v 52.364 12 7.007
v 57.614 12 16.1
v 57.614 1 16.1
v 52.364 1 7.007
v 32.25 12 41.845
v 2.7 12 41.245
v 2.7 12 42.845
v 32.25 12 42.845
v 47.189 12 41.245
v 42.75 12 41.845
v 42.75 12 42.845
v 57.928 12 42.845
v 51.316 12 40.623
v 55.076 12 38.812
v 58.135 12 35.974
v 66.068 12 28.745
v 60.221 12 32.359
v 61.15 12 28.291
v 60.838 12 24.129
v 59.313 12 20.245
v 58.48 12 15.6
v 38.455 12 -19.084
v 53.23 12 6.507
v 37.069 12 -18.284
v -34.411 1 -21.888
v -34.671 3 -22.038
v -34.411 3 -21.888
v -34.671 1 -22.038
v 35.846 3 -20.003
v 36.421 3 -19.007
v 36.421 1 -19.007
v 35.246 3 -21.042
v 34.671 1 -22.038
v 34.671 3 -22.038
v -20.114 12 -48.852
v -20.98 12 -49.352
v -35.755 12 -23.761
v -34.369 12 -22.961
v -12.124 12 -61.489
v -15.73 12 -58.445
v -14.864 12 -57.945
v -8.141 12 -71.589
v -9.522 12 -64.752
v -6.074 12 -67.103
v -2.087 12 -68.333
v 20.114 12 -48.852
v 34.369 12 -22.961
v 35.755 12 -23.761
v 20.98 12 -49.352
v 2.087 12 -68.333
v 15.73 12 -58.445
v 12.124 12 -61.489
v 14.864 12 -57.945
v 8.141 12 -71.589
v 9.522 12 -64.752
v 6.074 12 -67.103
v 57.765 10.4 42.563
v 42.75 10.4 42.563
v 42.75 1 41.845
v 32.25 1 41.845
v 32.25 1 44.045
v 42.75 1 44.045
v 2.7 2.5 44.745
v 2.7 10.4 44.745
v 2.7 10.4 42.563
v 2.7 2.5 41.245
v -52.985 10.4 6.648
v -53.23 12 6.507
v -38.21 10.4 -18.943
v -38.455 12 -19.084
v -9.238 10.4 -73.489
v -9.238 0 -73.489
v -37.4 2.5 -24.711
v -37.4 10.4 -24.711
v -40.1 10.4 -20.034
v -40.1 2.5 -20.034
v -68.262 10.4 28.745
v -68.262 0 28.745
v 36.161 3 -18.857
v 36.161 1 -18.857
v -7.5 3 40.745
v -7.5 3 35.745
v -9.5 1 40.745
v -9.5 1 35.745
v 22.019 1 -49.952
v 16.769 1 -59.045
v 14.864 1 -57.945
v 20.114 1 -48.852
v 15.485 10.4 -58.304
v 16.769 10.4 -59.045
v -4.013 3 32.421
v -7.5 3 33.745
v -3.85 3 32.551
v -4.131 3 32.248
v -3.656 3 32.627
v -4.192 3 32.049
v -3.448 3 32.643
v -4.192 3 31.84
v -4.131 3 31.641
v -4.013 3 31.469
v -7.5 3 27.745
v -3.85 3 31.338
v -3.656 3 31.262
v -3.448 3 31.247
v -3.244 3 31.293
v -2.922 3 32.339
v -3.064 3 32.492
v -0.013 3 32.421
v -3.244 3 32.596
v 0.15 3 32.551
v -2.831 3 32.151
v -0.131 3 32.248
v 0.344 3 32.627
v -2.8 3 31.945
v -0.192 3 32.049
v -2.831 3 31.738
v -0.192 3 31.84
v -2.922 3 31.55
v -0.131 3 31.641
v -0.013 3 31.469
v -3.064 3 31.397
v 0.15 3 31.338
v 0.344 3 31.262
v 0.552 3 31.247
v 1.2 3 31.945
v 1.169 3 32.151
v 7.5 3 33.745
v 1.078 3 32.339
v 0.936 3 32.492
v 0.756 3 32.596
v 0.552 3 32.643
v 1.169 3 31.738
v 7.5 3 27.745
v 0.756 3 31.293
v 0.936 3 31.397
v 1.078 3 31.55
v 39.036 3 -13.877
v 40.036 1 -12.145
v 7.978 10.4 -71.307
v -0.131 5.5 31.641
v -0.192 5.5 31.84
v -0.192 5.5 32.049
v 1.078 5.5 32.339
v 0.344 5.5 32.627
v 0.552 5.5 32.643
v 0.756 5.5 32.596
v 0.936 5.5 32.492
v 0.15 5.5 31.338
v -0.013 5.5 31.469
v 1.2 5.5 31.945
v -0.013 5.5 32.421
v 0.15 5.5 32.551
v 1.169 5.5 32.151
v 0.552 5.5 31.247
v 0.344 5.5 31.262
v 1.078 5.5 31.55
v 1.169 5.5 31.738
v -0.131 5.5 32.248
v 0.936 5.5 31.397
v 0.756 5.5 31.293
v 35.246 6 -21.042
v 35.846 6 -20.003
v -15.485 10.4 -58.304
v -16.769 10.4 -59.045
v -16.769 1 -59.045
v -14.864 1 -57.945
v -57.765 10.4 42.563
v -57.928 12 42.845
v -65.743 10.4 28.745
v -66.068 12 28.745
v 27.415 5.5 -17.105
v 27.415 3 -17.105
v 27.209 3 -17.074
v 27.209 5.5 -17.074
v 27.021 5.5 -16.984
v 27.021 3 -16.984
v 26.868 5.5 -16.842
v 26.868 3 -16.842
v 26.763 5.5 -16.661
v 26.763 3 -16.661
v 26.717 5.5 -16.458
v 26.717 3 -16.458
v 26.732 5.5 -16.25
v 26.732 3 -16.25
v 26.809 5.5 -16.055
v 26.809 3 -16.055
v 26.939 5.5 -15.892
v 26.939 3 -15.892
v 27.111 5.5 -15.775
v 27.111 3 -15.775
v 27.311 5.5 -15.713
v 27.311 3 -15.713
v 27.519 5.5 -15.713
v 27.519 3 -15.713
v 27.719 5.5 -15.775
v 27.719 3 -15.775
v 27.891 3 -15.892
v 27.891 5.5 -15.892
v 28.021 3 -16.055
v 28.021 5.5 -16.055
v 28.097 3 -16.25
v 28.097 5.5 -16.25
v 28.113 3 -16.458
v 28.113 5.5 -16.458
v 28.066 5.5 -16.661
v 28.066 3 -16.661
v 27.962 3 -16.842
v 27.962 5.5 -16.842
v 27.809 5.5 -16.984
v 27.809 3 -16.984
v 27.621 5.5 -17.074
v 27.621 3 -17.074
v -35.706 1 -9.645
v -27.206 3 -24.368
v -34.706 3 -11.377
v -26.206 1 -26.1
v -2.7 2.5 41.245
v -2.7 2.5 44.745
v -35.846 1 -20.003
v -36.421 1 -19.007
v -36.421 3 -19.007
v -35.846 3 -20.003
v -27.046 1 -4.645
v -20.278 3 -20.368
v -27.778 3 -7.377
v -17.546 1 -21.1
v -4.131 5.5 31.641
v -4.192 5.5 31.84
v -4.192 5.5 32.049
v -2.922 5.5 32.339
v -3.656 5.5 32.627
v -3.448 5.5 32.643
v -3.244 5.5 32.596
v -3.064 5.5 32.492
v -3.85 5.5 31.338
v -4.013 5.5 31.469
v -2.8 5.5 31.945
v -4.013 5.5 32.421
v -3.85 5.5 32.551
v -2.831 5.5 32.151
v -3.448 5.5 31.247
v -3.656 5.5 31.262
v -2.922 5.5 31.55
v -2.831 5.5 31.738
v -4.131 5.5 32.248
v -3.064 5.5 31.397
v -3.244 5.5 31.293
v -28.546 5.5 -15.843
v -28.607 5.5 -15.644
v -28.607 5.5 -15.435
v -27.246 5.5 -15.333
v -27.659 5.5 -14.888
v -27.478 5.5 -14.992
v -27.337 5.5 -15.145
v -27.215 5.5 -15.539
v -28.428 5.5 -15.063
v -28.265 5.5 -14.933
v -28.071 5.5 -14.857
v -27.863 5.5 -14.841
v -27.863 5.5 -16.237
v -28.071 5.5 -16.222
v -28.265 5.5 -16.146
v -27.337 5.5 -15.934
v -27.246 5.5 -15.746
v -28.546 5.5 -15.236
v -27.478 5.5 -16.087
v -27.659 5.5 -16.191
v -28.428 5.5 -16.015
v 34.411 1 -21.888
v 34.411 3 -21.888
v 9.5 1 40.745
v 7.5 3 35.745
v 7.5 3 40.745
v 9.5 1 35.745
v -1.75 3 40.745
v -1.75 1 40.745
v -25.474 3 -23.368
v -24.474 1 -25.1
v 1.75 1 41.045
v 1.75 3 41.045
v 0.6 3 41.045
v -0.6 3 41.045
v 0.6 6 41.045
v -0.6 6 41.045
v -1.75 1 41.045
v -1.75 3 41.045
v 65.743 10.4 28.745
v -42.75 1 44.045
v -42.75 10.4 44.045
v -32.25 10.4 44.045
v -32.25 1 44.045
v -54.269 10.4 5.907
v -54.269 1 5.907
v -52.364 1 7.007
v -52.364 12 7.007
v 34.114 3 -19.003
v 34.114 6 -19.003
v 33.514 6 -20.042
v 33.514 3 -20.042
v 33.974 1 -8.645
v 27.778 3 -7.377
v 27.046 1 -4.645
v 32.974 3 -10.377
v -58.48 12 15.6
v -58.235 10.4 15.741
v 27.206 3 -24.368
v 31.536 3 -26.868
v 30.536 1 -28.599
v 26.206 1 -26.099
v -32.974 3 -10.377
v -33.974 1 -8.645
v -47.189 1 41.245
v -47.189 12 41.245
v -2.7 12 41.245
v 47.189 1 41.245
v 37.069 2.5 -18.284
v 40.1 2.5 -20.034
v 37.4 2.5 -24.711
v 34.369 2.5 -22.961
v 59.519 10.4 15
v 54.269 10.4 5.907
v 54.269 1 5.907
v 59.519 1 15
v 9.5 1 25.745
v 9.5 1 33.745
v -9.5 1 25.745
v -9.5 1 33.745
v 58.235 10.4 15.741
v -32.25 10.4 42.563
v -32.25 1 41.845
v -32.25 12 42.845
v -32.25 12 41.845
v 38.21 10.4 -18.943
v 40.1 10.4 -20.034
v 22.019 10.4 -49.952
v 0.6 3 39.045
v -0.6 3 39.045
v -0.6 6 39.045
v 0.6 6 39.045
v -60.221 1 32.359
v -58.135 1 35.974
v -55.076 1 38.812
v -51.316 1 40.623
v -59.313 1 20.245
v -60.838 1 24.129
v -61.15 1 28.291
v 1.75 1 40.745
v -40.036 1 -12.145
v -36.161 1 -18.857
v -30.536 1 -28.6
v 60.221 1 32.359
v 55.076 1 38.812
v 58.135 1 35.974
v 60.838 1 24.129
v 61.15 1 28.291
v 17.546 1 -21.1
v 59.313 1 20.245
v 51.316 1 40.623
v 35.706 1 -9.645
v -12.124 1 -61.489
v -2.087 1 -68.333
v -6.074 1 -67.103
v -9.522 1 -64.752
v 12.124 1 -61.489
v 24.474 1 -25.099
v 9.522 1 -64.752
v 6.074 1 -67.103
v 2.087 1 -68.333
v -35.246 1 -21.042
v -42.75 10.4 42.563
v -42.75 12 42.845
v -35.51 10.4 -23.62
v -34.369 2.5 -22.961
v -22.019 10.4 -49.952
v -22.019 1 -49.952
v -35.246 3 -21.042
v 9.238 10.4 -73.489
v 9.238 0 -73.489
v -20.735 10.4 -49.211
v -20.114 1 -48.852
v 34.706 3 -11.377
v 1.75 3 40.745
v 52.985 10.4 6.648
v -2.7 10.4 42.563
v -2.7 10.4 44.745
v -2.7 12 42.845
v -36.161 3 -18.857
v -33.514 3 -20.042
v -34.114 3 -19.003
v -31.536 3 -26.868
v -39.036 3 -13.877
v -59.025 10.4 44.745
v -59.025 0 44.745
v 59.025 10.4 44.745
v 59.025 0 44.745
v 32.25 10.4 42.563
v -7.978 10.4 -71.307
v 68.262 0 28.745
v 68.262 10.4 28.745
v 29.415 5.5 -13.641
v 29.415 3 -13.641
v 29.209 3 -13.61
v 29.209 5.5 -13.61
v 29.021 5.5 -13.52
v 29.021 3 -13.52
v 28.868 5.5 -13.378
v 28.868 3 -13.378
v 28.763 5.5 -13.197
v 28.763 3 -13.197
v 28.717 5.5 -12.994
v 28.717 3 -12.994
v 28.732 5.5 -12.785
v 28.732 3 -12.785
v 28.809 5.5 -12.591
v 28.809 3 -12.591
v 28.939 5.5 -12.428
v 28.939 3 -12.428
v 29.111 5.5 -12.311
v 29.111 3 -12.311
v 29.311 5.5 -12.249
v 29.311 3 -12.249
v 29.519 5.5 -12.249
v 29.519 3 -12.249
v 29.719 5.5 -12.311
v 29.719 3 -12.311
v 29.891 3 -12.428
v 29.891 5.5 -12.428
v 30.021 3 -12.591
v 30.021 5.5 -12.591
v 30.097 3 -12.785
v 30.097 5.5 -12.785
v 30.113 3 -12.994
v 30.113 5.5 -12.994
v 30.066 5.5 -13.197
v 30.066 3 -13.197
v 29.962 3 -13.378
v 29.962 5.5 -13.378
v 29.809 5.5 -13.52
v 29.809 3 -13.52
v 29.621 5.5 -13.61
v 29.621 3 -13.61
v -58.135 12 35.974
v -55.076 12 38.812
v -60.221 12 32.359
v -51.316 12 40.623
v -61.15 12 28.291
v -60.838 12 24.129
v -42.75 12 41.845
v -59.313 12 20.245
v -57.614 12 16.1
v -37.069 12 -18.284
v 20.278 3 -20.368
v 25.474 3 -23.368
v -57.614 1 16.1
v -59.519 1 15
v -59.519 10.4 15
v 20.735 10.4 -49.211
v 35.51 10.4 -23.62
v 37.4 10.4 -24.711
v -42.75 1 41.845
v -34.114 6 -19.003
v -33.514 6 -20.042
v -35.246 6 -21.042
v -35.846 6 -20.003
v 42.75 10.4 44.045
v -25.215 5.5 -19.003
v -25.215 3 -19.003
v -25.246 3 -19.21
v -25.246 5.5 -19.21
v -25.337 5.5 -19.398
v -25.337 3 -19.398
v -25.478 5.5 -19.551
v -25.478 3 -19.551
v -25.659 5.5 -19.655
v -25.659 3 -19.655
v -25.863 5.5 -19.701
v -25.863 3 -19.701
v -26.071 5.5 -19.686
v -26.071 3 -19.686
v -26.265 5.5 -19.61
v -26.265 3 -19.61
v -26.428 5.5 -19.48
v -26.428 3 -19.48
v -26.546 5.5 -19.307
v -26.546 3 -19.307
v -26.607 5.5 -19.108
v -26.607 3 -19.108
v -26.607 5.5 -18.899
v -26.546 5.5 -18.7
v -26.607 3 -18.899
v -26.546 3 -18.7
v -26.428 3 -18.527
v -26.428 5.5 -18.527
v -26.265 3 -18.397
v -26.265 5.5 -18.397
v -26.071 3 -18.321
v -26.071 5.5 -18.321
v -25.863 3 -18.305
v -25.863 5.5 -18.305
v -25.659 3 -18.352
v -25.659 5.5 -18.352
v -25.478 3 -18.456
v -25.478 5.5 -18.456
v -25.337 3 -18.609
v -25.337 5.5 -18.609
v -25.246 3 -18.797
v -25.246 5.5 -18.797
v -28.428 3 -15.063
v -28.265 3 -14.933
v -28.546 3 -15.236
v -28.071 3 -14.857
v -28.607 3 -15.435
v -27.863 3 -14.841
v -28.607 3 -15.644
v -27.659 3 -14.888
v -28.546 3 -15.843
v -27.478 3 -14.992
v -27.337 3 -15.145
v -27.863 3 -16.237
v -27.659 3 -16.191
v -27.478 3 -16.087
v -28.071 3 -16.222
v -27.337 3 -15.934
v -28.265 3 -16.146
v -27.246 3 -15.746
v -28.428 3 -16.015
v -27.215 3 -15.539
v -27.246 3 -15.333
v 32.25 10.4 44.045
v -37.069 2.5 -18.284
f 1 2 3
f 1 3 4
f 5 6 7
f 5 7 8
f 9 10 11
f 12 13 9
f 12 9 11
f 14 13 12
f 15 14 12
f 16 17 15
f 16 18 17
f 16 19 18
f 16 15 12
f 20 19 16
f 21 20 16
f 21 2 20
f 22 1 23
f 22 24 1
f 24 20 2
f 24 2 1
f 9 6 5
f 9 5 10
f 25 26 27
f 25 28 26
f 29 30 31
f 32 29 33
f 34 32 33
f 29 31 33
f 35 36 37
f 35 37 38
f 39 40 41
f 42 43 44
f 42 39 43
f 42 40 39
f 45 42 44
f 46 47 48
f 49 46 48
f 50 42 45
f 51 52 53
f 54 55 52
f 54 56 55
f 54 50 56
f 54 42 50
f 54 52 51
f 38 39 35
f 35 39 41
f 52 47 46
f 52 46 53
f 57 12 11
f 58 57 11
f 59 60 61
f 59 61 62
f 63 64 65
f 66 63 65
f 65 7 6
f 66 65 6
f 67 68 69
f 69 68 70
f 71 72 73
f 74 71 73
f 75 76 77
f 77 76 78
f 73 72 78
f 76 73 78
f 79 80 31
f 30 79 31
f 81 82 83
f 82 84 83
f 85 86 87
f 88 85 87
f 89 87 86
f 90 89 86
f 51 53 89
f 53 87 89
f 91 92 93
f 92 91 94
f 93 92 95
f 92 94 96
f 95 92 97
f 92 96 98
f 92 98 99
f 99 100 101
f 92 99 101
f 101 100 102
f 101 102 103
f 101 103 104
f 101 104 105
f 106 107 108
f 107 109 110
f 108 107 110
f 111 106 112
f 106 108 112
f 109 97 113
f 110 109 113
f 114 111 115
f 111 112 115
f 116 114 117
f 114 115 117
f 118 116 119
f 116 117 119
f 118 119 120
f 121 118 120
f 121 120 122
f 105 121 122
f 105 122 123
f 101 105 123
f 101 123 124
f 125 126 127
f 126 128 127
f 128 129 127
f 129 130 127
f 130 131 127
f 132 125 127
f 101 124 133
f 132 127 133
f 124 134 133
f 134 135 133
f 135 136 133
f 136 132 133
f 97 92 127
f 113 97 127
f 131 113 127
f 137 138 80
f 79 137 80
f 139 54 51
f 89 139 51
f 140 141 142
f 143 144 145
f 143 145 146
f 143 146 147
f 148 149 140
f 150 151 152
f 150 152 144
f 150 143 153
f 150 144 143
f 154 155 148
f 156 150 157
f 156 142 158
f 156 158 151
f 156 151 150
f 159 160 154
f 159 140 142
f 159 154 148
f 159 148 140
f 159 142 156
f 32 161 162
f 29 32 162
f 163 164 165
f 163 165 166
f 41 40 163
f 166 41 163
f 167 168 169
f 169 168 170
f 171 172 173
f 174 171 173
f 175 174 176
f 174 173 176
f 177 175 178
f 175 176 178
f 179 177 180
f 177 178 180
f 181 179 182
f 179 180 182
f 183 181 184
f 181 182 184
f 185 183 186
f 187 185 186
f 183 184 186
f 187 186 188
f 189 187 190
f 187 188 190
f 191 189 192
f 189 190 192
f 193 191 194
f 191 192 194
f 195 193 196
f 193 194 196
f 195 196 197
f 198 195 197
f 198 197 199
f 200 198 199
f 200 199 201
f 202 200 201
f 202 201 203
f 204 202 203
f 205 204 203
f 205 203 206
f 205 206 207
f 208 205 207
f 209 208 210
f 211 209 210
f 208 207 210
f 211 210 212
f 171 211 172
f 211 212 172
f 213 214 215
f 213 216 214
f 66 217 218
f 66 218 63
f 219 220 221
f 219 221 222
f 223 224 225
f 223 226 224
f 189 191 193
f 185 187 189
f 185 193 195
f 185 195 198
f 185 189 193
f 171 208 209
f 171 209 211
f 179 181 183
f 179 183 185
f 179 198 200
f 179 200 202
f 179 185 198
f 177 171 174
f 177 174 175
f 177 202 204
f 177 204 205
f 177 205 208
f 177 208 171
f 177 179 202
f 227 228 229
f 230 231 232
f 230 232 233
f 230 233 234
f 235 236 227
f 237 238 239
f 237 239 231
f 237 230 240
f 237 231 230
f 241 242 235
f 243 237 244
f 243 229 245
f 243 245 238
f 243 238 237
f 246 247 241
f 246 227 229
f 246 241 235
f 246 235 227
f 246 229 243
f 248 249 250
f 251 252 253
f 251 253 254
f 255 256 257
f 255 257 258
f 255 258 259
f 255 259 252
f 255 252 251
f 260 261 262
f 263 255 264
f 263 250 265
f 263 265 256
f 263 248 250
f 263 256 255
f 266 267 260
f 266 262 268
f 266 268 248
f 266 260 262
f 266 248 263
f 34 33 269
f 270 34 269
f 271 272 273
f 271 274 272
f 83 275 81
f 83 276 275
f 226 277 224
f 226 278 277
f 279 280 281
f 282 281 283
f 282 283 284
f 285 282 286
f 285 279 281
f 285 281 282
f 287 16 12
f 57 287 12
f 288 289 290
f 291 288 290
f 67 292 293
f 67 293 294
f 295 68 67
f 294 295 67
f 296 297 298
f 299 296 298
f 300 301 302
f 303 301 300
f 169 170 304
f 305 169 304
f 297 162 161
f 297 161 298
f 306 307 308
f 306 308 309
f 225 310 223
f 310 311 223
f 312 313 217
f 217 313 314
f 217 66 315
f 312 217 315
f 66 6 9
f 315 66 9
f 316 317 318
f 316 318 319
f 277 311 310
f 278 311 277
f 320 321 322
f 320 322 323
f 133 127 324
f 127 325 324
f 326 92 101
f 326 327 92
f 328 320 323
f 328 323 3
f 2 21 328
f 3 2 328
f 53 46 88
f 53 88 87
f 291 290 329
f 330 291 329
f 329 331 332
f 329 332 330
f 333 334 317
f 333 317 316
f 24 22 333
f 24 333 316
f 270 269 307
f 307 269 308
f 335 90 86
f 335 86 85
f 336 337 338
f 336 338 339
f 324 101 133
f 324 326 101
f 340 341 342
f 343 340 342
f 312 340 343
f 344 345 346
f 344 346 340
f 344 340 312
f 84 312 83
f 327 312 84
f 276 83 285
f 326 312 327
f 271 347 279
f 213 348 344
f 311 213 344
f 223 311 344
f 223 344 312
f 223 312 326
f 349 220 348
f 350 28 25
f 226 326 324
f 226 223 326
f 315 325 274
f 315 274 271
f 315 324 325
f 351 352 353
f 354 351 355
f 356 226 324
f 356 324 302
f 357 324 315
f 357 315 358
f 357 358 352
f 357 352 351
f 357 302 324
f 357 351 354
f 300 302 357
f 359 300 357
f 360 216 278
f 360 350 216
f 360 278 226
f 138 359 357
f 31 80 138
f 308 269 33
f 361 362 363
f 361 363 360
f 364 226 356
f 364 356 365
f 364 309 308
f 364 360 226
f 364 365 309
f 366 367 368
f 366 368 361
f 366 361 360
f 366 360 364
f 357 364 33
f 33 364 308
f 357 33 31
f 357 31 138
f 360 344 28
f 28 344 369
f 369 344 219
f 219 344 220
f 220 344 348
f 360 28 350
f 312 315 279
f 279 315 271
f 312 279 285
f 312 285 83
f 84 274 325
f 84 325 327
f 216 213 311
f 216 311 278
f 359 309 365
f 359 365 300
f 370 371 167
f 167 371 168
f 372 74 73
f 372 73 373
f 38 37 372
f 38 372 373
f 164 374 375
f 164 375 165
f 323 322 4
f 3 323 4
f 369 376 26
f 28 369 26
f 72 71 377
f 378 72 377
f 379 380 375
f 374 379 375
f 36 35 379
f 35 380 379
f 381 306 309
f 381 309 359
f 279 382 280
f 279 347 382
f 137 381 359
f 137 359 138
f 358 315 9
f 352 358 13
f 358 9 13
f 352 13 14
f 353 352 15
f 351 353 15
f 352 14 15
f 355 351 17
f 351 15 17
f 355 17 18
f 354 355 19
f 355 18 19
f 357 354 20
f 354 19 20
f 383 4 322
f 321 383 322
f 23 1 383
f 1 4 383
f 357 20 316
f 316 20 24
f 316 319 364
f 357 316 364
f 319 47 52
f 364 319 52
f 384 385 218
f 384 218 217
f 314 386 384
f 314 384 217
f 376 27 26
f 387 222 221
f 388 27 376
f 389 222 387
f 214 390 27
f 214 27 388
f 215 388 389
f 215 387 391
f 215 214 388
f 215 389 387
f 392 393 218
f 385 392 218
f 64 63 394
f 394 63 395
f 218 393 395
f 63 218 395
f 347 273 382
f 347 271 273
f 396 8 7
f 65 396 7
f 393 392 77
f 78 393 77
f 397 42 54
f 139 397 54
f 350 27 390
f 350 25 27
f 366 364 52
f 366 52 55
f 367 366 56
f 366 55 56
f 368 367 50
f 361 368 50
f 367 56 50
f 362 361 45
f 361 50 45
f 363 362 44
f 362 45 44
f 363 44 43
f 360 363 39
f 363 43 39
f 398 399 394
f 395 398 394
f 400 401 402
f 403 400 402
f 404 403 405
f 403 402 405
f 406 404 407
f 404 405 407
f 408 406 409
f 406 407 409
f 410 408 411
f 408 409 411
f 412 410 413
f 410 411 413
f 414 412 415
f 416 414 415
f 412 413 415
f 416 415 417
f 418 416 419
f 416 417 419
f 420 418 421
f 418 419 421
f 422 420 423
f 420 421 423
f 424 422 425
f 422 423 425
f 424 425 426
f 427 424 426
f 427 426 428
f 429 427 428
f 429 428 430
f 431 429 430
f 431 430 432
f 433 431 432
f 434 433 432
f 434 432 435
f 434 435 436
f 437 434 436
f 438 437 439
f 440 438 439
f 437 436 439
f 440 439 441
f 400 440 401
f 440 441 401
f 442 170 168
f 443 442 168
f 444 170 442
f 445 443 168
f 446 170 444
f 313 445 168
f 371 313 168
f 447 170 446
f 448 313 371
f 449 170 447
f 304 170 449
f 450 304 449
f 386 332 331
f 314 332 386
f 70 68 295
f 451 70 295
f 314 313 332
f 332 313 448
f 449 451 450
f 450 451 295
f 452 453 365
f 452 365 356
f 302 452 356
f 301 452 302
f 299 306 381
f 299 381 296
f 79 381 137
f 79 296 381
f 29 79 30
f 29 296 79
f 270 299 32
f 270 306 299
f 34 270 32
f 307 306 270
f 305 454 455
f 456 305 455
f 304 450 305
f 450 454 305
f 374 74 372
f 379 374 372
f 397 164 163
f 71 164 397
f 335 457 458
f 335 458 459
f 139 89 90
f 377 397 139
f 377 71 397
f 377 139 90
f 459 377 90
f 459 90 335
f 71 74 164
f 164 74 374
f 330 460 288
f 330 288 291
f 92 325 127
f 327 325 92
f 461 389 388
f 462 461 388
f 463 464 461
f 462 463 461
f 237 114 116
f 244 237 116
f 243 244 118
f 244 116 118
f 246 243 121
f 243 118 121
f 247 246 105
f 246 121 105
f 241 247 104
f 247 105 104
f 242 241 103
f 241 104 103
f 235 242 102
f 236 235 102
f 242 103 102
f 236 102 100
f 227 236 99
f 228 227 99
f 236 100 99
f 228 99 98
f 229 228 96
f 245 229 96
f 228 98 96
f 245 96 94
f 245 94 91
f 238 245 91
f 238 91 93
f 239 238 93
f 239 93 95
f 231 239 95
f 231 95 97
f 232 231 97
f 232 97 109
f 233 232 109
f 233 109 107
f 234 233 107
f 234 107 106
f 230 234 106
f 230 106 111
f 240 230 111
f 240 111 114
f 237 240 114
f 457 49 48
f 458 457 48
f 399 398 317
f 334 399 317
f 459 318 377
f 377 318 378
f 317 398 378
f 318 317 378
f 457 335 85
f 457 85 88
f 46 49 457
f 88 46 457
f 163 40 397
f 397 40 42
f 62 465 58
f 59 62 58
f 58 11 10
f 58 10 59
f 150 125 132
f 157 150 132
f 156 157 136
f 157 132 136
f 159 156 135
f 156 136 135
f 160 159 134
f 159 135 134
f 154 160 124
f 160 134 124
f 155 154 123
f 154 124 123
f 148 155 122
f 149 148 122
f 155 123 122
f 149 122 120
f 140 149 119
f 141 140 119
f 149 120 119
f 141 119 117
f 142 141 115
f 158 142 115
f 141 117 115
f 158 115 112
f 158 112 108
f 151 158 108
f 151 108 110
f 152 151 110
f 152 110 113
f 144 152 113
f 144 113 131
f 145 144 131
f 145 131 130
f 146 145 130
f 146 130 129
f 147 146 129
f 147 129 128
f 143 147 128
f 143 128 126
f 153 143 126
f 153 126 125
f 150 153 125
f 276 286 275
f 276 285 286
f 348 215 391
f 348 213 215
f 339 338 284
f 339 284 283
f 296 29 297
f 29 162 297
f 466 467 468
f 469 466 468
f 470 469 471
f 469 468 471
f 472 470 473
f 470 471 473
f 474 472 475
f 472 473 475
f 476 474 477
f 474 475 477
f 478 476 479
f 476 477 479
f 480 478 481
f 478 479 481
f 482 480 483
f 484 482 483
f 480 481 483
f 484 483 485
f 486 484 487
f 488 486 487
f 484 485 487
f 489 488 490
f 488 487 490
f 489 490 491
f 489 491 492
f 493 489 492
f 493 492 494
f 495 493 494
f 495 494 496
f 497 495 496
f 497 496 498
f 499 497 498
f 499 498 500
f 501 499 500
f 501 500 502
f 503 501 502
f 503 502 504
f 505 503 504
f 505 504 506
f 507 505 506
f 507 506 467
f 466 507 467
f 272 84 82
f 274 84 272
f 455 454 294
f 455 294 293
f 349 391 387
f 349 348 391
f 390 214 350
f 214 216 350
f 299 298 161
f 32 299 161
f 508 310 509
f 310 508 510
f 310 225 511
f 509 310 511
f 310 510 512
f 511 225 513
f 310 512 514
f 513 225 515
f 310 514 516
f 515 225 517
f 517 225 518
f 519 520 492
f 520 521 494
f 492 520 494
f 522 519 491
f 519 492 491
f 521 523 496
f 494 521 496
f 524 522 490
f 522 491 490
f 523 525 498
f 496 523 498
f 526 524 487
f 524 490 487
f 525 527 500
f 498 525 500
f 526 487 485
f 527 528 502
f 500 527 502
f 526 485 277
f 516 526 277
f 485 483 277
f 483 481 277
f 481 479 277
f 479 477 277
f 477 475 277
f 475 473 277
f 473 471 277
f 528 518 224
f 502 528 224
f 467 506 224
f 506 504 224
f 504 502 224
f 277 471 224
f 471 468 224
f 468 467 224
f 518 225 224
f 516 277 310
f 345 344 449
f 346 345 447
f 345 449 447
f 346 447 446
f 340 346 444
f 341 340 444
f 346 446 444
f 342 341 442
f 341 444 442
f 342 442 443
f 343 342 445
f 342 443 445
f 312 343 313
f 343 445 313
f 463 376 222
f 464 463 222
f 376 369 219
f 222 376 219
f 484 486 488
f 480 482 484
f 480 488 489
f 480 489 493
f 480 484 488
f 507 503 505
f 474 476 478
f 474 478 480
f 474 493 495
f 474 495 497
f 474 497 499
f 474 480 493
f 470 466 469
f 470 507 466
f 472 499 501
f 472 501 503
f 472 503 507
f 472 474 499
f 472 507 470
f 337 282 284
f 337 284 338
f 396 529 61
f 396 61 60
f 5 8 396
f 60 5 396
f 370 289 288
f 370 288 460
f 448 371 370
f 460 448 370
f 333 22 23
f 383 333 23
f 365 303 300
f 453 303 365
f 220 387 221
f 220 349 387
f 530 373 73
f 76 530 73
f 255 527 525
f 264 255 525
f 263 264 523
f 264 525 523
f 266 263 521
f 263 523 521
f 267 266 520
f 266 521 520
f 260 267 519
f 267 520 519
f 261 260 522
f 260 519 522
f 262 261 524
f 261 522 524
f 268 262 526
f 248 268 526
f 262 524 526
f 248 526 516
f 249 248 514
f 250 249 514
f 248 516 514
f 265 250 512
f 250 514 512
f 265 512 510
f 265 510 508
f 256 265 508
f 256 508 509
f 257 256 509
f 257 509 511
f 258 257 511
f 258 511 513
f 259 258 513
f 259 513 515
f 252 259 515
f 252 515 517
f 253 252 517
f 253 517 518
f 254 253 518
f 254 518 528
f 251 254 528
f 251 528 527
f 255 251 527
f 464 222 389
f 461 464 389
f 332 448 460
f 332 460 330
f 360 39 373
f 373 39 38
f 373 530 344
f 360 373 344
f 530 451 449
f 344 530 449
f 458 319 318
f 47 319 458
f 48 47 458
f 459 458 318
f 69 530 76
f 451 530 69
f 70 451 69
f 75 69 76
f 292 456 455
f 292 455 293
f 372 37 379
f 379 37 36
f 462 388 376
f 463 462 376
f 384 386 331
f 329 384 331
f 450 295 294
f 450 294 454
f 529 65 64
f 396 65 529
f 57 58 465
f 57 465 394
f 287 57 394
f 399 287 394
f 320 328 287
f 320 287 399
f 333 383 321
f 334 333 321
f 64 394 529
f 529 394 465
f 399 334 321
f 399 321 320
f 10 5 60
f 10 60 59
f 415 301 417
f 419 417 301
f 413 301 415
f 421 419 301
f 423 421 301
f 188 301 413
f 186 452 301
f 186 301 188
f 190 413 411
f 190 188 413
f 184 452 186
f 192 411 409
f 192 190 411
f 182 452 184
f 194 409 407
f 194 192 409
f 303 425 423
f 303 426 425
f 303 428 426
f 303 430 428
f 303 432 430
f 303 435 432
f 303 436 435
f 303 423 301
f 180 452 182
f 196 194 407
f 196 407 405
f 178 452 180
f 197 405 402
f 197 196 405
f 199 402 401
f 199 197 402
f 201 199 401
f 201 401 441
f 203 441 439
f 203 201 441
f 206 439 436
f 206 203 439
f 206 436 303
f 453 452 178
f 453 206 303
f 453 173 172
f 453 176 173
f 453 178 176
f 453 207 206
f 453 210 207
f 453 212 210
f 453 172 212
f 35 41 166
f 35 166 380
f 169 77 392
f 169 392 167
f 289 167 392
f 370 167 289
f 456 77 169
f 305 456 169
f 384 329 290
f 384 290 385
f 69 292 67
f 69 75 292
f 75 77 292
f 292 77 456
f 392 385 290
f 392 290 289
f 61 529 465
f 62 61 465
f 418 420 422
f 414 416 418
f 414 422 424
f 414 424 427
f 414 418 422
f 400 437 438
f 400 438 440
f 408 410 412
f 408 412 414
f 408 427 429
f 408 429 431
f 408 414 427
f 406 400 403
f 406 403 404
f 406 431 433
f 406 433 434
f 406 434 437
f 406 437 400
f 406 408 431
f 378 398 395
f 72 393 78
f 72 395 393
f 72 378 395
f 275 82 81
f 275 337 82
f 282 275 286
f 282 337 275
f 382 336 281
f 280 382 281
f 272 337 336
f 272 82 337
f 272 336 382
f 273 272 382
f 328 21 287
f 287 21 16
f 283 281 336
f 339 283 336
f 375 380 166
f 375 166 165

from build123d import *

# Parameters (mm, degrees)
BOSS_EXTRU_1_DEPTH                        = 12
ENL_V_MAT_EXTRU_1_DEPTH                   = 119.989845505
ENL_V_MAT_EXTRU_2_DEPTH                   = 11
ESQUISSE4_W                               = 5.4
ESQUISSE4_H                               = 3.5
ENL_V_MAT_EXTRU_3_DEPTH                   = 9.5
BOSS_EXTRU_2_DEPTH                        = 2
ESQUISSE13_R                              = 0.7
BOSS_EXTRU_3_DEPTH                        = 2.5
BOSS_EXTRU_8_DEPTH                        = 3
CHANFREIN4_SIZE                           = 2
ENL_V_MAT_EXTRU_11_DEPTH                  = 2
R_P_TITION_START                          = 1
R_P_TITION_CIRCULAIRE1_OUTLINE_W          = 1.2
R_P_TITION_CIRCULAIRE1_OUTLINE_H          = 2
R_P_TITION_CIRCULAIRE1_OUTLINE_R          = 0.7
R_P_TITION_CIRCULAIRE1_DEPTH              = 4.5
R_P_TITION_START_2                        = 5.5
R_P_TITION_CIRCULAIRE1_2_OUTLINE_W        = 1.2
R_P_TITION_CIRCULAIRE1_2_OUTLINE_H        = 2
R_P_TITION_CIRCULAIRE1_2_DEPTH            = 0.5
ENL_V_DE_MAT_EXTRU_MINCE1_DEPTH           = 1.6
ENL_V_DE_MAT_EXTRU_MINCE1_DRAFT           = 10
ENL_V_DE_MAT_EXTRU_MINCE1_PROFILE_2_DEPTH = 1.6
ENL_V_DE_MAT_EXTRU_MINCE1_PROFILE_2_DRAFT = 10
ENL_V_DE_MAT_EXTRU_MINCE1_PROFILE_3_DEPTH = 1.6
ENL_V_DE_MAT_EXTRU_MINCE1_PROFILE_3_DRAFT = 10
ESQUISSE18_W                              = 10.5
ESQUISSE18_H                              = 2.2
ENL_V_MAT_EXTRU_10_DEPTH                  = 11


with BuildPart() as part:
    # Esquisse1 → Boss.-Extru.1 (new body)
    with BuildSketch(Plane(origin=(0, 0, 0), x_dir=(1, 0, 0), z_dir=(0, 1, 0))):
        Polygon((-77.5, -44.744645862), (77.5, -44.744645862), (0, 89.489291724), align=None)
    extrude(amount=BOSS_EXTRU_1_DEPTH)

    # Esquisse2 → Enlèv. mat.-Extru.1 (cut, through all)
    with BuildSketch(Plane(origin=(0, 12, 0), x_dir=(1, 0, 0), z_dir=(0, 1, 0))):
        Polygon((-9.237604307, 73.489291724), (9.237604307, 73.489291724), (0, 89.489291724), align=None)
        Polygon((77.5, -44.744645862), (68.262395693, -28.744645862), (59.024791386, -44.744645862), align=None)
        Polygon((-77.5, -44.744645862), (-59.024791386, -44.744645862), (-68.262395693, -28.744645862), align=None)
    extrude(amount=-ENL_V_MAT_EXTRU_1_DEPTH, mode=Mode.SUBTRACT)

    # Esquisse3 → Enlèv. mat.-Extru.2 (cut)
    with BuildSketch(Plane(origin=(0, 12, 0), x_dir=(1, 0, 0), z_dir=(0, 1, 0))):
        with BuildLine():
            Line((59.313466521, -20.244645862), (12.124355653, 61.489291724))
            ThreePointArc((12.124355653, 61.489291724), (0, 68.489291724), (-12.124355653, 61.489291724))
            Line((-12.124355653, 61.489291724), (-59.313466521, -20.244645862))
            ThreePointArc((-59.313466521, -20.244645862), (-59.313466521, -34.244645862), (-47.189110868, -41.244645862))
            Line((-47.189110868, -41.244645862), (47.189110868, -41.244645862))
            ThreePointArc((47.189110868, -41.244645862), (59.313466521, -34.244645862), (59.313466521, -20.244645862))
        make_face()
    extrude(amount=-ENL_V_MAT_EXTRU_2_DEPTH, mode=Mode.SUBTRACT)

    # Esquisse4 → Enlèv. mat.-Extru.3 (cut)
    with BuildSketch(Plane(origin=(0, 12, 0), x_dir=(1, 0, 0), z_dir=(0, 1, 0))):
        Polygon((37.068911087, 18.284054341), (34.368911087, 22.960591521), (37.4, 24.710591521), (40.1, 20.034054341), align=None)
        with Locations((0, -42.994645862)):
            Rectangle(ESQUISSE4_W, ESQUISSE4_H)
        Polygon((-37.4, 24.710591521), (-34.368911087, 22.960591521), (-37.068911087, 18.284054341), (-40.1, 20.034054341), align=None)
    extrude(amount=-ENL_V_MAT_EXTRU_3_DEPTH, mode=Mode.SUBTRACT)

    # Esquisse12 → Boss.-Extru.2 (add)
    with BuildSketch(Plane(origin=(0, 1, 0), x_dir=(1, 0, 0), z_dir=(0, 1, 0))):
        Polygon((20.277568136, 20.367513459), (27.777568136, 7.377132403), (39.035898385, 13.877132403), (36.160898385, 18.856778474), (36.420706006, 19.006778474), (34.670706006, 22.037867388), (34.410898385, 21.887867388), (31.535898385, 26.867513459), align=None)
    extrude(amount=BOSS_EXTRU_2_DEPTH)

    # Esquisse13 → Boss.-Extru.3 (add)
    with BuildSketch(Plane(origin=(0, 3, 0), x_dir=(1, 0, 0), z_dir=(0, 1, 0))):
        with Locations(Location((27.414874832, 16.405335633, 0), (0, 0, 90))):
            Circle(ESQUISSE13_R)
        with Locations(Location((29.414874832, 12.941234018, 0), (0, 0, 90))):
            Circle(ESQUISSE13_R)
    extrude(amount=BOSS_EXTRU_3_DEPTH)

    # Esquisse20 → Boss.-Extru.8 (add, symmetric)
    with BuildSketch(Plane(origin=(0, 3, 0), x_dir=(1, 0, 0), z_dir=(0, 1, 0))):
        Polygon((35.245706006, 21.041938173), (35.845706006, 20.002707689), (34.113655198, 19.002707689), (33.513655198, 20.041938173), align=None)
    extrude(amount=BOSS_EXTRU_8_DEPTH, both=True)

    # Chanfrein4
    chanfrein4_edges = [part.edges().sort_by_distance(p)[0] for p in [
        (25.90673326, 1, -23.617513459),
        (24.027568136, 1, -13.872322931),
        (33.40673326, 1, -10.627132403),
    ]]
    chamfer(chanfrein4_edges, length=CHANFREIN4_SIZE - 0.0001)  # a hair under: the kernel refuses the full size

    # Esquisse21 → Enlèv. mat.-Extru.11 (cut)
    with BuildSketch(Plane(origin=(0, 3, 0), x_dir=(1, 0, 0), z_dir=(0, 1, 0))):
        Polygon((24.473720558, 25.099564267), (26.205771366, 26.099564267), (35.705771366, 9.645081595), (33.973720558, 8.645081595), align=None)
    extrude(amount=-ENL_V_MAT_EXTRU_11_DEPTH, mode=Mode.SUBTRACT)

    # Répétition circulaire1: read off the stored shape, not the designer's step
    # Répétition circulaire1 outline → Répétition circulaire1 (add)
    with BuildSketch(Plane(origin=(0, 0, 0), x_dir=(1, 0, 0), z_dir=(0, 1, 0)).offset(R_P_TITION_START)):
        Polygon((-35.245706006, 21.041938173), (-35.845706006, 20.002707689), (-34.113655198, 19.002707689), (-33.513655198, 20.041938173), align=None)
        with Locations((0, -40.044645862)):
            Rectangle(R_P_TITION_CIRCULAIRE1_OUTLINE_W, R_P_TITION_CIRCULAIRE1_OUTLINE_H)
        with Locations((-27.914874832, 15.539310229)):
            Circle(R_P_TITION_CIRCULAIRE1_OUTLINE_R)
        with Locations((-25.914874832, 19.003411844)):
            Circle(R_P_TITION_CIRCULAIRE1_OUTLINE_R)
        with Locations((0.5, -31.944645862)):
            Circle(R_P_TITION_CIRCULAIRE1_OUTLINE_R)
        with Locations((-3.5, -31.944645862)):
            Circle(R_P_TITION_CIRCULAIRE1_OUTLINE_R)
    extrude(amount=R_P_TITION_CIRCULAIRE1_DEPTH)

    # R_p_tition circulaire1 2 outline → R_p_tition circulaire1 2 (add)
    with BuildSketch(Plane(origin=(0, 0, 0), x_dir=(1, 0, 0), z_dir=(0, 1, 0)).offset(R_P_TITION_START_2)):
        Polygon((-35.245706006, 21.041938173), (-35.845706006, 20.002707689), (-34.113655198, 19.002707689), (-33.513655198, 20.041938173), align=None)
        with Locations((0, -40.044645862)):
            Rectangle(R_P_TITION_CIRCULAIRE1_2_OUTLINE_W, R_P_TITION_CIRCULAIRE1_2_OUTLINE_H)
    extrude(amount=R_P_TITION_CIRCULAIRE1_2_DEPTH)

    # R_p_tition circulaire1 3: loft between two sections, ruled curve by curve
    r_p_tition_circulaire1_3_from = [
        Edge.make_line((-25.473720558, 3, -23.367513459), (-20.277568136, 3, -20.367513459)),
        Edge.make_line((-32.973720558, 3, -10.377132403), (-27.777568136, 3, -7.377132403)),
        Edge.make_line((-20.277568136, 3, -20.367513459), (-27.777568136, 3, -7.377132403)),
        Edge.make_line((-32.973720558, 3, -10.377132403), (-25.473720558, 3, -23.367513459)),
    ]
    r_p_tition_circulaire1_3_to = [
        Edge.make_line((-24.473720558, 1, -25.099564267), (-17.545517328, 1, -21.099564267)),
        Edge.make_line((-33.973720558, 1, -8.645081595), (-27.045517328, 1, -4.645081595)),
        Edge.make_line((-17.545517328, 1, -21.099564267), (-27.045517328, 1, -4.645081595)),
        Edge.make_line((-33.973720558, 1, -8.645081595), (-24.473720558, 1, -25.099564267)),
    ]
    r_p_tition_circulaire1_3 = Solid(Shell([*[Face.make_surface_from_curves(r_p_tition_circulaire1_3_from[k], r_p_tition_circulaire1_3_to[k]) for k in range(4)], Face(Wire(r_p_tition_circulaire1_3_from)), Face(Wire(r_p_tition_circulaire1_3_to))]))
    add(r_p_tition_circulaire1_3)

    # R_p_tition circulaire1 4: loft between two sections, ruled curve by curve
    r_p_tition_circulaire1_4_from = [
        Edge.make_line((-7.5, 3, 33.744645862), (-7.5, 3, 27.744645862)),
        Edge.make_line((7.5, 3, 33.744645862), (7.5, 3, 27.744645862)),
        Edge.make_line((-7.5, 3, 27.744645862), (7.5, 3, 27.744645862)),
        Edge.make_line((7.5, 3, 33.744645862), (-7.5, 3, 33.744645862)),
    ]
    r_p_tition_circulaire1_4_to = [
        Edge.make_line((-9.5, 1, 33.744645862), (-9.5, 1, 25.744645862)),
        Edge.make_line((9.5, 1, 33.744645862), (9.5, 1, 25.744645862)),
        Edge.make_line((-9.5, 1, 25.744645862), (9.5, 1, 25.744645862)),
        Edge.make_line((9.5, 1, 33.744645862), (-9.5, 1, 33.744645862)),
    ]
    r_p_tition_circulaire1_4 = Solid(Shell([*[Face.make_surface_from_curves(r_p_tition_circulaire1_4_from[k], r_p_tition_circulaire1_4_to[k]) for k in range(4)], Face(Wire(r_p_tition_circulaire1_4_from)), Face(Wire(r_p_tition_circulaire1_4_to))]))
    add(r_p_tition_circulaire1_4)

    # R_p_tition circulaire1 5: loft between two sections, ruled curve by curve
    r_p_tition_circulaire1_5_from = [
        Edge.make_line((-27.205771366, 3, -24.367513459), (-31.535898385, 3, -26.867513459)),
        Edge.make_line((-34.705771366, 3, -11.377132403), (-39.035898385, 3, -13.877132403)),
        Edge.make_line((-34.410898385, 3, -21.887867388), (-31.535898385, 3, -26.867513459)),
        Edge.make_line((-39.035898385, 3, -13.877132403), (-36.160898385, 3, -18.856778474)),
        Edge.make_line((-34.670706006, 3, -22.037867388), (-34.410898385, 3, -21.887867388)),
        Edge.make_line((-36.160898385, 3, -18.856778474), (-36.420706006, 3, -19.006778474)),
        Edge.make_line((-27.205771366, 3, -24.367513459), (-34.705771366, 3, -11.377132403)),
        Edge.make_line((-36.420706006, 3, -19.006778474), (-34.670706006, 3, -22.037867388)),
    ]
    r_p_tition_circulaire1_5_to = [
        Edge.make_line((-26.205771366, 1, -26.099564267), (-30.535898385, 1, -28.599564267)),
        Edge.make_line((-35.705771366, 1, -9.645081595), (-40.035898385, 1, -12.145081595)),
        Edge.make_line((-34.410898385, 1, -21.887867388), (-30.535898385, 1, -28.599564267)),
        Edge.make_line((-40.035898385, 1, -12.145081595), (-36.160898385, 1, -18.856778474)),
        Edge.make_line((-34.670706006, 1, -22.037867388), (-34.410898385, 1, -21.887867388)),
        Edge.make_line((-36.160898385, 1, -18.856778474), (-36.420706006, 1, -19.006778474)),
        Edge.make_line((-26.205771366, 1, -26.099564267), (-35.705771366, 1, -9.645081595)),
        Edge.make_line((-36.420706006, 1, -19.006778474), (-34.670706006, 1, -22.037867388)),
    ]
    r_p_tition_circulaire1_5 = Solid(Shell([*[Face.make_surface_from_curves(r_p_tition_circulaire1_5_from[k], r_p_tition_circulaire1_5_to[k]) for k in range(8)], Face(Wire(r_p_tition_circulaire1_5_from)), Face(Wire(r_p_tition_circulaire1_5_to))]))
    add(r_p_tition_circulaire1_5)

    # R_p_tition circulaire1 6: loft between two sections, ruled curve by curve
    r_p_tition_circulaire1_6_from = [
        Edge.make_line((-7.5, 3, 35.744645862), (-7.5, 3, 40.744645862)),
        Edge.make_line((7.5, 3, 35.744645862), (7.5, 3, 40.744645862)),
        Edge.make_line((-1.75, 3, 40.744645862), (-7.5, 3, 40.744645862)),
        Edge.make_line((7.5, 3, 40.744645862), (1.75, 3, 40.744645862)),
        Edge.make_line((-1.75, 3, 41.044645862), (-1.75, 3, 40.744645862)),
        Edge.make_line((1.75, 3, 40.744645862), (1.75, 3, 41.044645862)),
        Edge.make_line((-7.5, 3, 35.744645862), (7.5, 3, 35.744645862)),
        Edge.make_line((1.75, 3, 41.044645862), (-1.75, 3, 41.044645862)),
    ]
    r_p_tition_circulaire1_6_to = [
        Edge.make_line((-9.5, 1, 35.744645862), (-9.5, 1, 40.744645862)),
        Edge.make_line((9.5, 1, 35.744645862), (9.5, 1, 40.744645862)),
        Edge.make_line((-1.75, 1, 40.744645862), (-9.5, 1, 40.744645862)),
        Edge.make_line((9.5, 1, 40.744645862), (1.75, 1, 40.744645862)),
        Edge.make_line((-1.75, 1, 41.044645862), (-1.75, 1, 40.744645862)),
        Edge.make_line((1.75, 1, 40.744645862), (1.75, 1, 41.044645862)),
        Edge.make_line((-9.5, 1, 35.744645862), (9.5, 1, 35.744645862)),
        Edge.make_line((1.75, 1, 41.044645862), (-1.75, 1, 41.044645862)),
    ]
    r_p_tition_circulaire1_6 = Solid(Shell([*[Face.make_surface_from_curves(r_p_tition_circulaire1_6_from[k], r_p_tition_circulaire1_6_to[k]) for k in range(8)], Face(Wire(r_p_tition_circulaire1_6_from)), Face(Wire(r_p_tition_circulaire1_6_to))]))
    add(r_p_tition_circulaire1_6)


with BuildPart() as enl_v_de_mat_extru_mince1_tool:
    # Esquisse17 → Enlèv. de mat.-Extru.-Mince1 (with draft: the straight prism first)
    with BuildSketch(Plane(origin=(0, 12, 0), x_dir=(1, 0, 0), z_dir=(0, 1, 0))):
        Polygon((37.4, 24.710591521), (9.237604307, 73.489291724), (-9.237604307, 73.489291724), (-37.4, 24.710591521), (-35.754551733, 23.760591521), (-8.140638796, 71.589291724), (8.140638796, 71.589291724), (35.754551733, 23.760591521), align=None)
    extrude(amount=-ENL_V_DE_MAT_EXTRU_MINCE1_DEPTH)
    # Enlèv. de mat.-Extru.-Mince1: the draft: its side faces are tilted about the plane it starts from
    enl_v_de_mat_extru_mince1_sides = [enl_v_de_mat_extru_mince1_tool.faces().sort_by_distance(p)[0] for p in [
        (23.318802154, 11.2, -49.099941623),
        (0, 11.2, -73.489291724),
        (-23.318802154, 11.2, -49.099941623),
        (-36.577275866, 11.2, -24.235591521),
        (-21.947595264, 11.2, -47.674941623),
        (0, 11.2, -71.589291724),
        (21.947595264, 11.2, -47.674941623),
        (36.577275866, 11.2, -24.235591521),
    ]]
    draft(enl_v_de_mat_extru_mince1_sides, Plane(origin=(0, 12, 0), x_dir=(1, 0, 0), z_dir=(0, 1, 0)), ENL_V_DE_MAT_EXTRU_MINCE1_DRAFT)


with BuildPart() as part_1:
    add(part.part)

    # Enlèv. de mat.-Extru.-Mince1: cut by enl_v_de_mat_extru_mince1_tool
    add(enl_v_de_mat_extru_mince1_tool.part, mode=Mode.SUBTRACT)


with BuildPart() as enl_v_de_mat_extru_mince1_profile_2_tool:
    # Esquisse17 → Enlèv. de mat.-Extru.-Mince1 profile 2 (with draft: the straight prism first)
    with BuildSketch(Plane(origin=(0, 12, 0), x_dir=(1, 0, 0), z_dir=(0, 1, 0))):
        Polygon((-40.1, 20.034054341), (-68.262395693, -28.744645862), (-59.024791386, -44.744645862), (-2.7, -44.744645862), (-2.7, -42.844645862), (-57.927825874, -42.844645862), (-66.06846467, -28.744645862), (-38.454551733, 19.084054341), align=None)
    extrude(amount=-ENL_V_DE_MAT_EXTRU_MINCE1_PROFILE_2_DEPTH)
    # Enlèv. de mat.-Extru.-Mince1 profile 2: the draft: its side faces are tilted about the plane it starts from
    enl_v_de_mat_extru_mince1_profile_2_sides = [enl_v_de_mat_extru_mince1_profile_2_tool.faces().sort_by_distance(p)[0] for p in [
        (-54.181197846, 11.2, 4.355295761),
        (-63.643593539, 11.2, 36.744645862),
        (-30.862395693, 11.2, 44.744645862),
        (-2.7, 11.2, 43.794645862),
        (-30.313912937, 11.2, 42.844645862),
        (-61.998145272, 11.2, 35.794645862),
        (-52.261508201, 11.2, 4.830295761),
        (-39.277275866, 11.2, -19.559054341),
    ]]
    draft(enl_v_de_mat_extru_mince1_profile_2_sides, Plane(origin=(0, 12, 0), x_dir=(1, 0, 0), z_dir=(0, 1, 0)), ENL_V_DE_MAT_EXTRU_MINCE1_PROFILE_2_DRAFT)


with BuildPart() as part_2:
    add(part_1.part)

    # Enlèv. de mat.-Extru.-Mince1 profile 2: cut by enl_v_de_mat_extru_mince1_profile_2_tool
    add(enl_v_de_mat_extru_mince1_profile_2_tool.part, mode=Mode.SUBTRACT)


with BuildPart() as enl_v_de_mat_extru_mince1_profile_3_tool:
    # Esquisse17 → Enlèv. de mat.-Extru.-Mince1 profile 3 (with draft: the straight prism first)
    with BuildSketch(Plane(origin=(0, 12, 0), x_dir=(1, 0, 0), z_dir=(0, 1, 0))):
        Polygon((2.7, -44.744645862), (59.024791386, -44.744645862), (68.262395693, -28.744645862), (40.1, 20.034054341), (38.454551733, 19.084054341), (66.06846467, -28.744645862), (57.927825874, -42.844645862), (2.7, -42.844645862), align=None)
    extrude(amount=-ENL_V_DE_MAT_EXTRU_MINCE1_PROFILE_3_DEPTH)
    # Enlèv. de mat.-Extru.-Mince1 profile 3: the draft: its side faces are tilted about the plane it starts from
    enl_v_de_mat_extru_mince1_profile_3_sides = [enl_v_de_mat_extru_mince1_profile_3_tool.faces().sort_by_distance(p)[0] for p in [
        (30.862395693, 11.2, 44.744645862),
        (63.643593539, 11.2, 36.744645862),
        (54.181197846, 11.2, 4.355295761),
        (39.277275866, 11.2, -19.559054341),
        (52.261508201, 11.2, 4.830295761),
        (61.998145272, 11.2, 35.794645862),
        (30.313912937, 11.2, 42.844645862),
        (2.7, 11.2, 43.794645862),
    ]]
    draft(enl_v_de_mat_extru_mince1_profile_3_sides, Plane(origin=(0, 12, 0), x_dir=(1, 0, 0), z_dir=(0, 1, 0)), ENL_V_DE_MAT_EXTRU_MINCE1_PROFILE_3_DRAFT)


with BuildPart() as part_3:
    add(part_2.part)

    # Enlèv. de mat.-Extru.-Mince1 profile 3: cut by enl_v_de_mat_extru_mince1_profile_3_tool
    add(enl_v_de_mat_extru_mince1_profile_3_tool.part, mode=Mode.SUBTRACT)

    # Esquisse18 → Enlèv. mat.-Extru.10 (cut)
    with BuildSketch(Plane(origin=(0, 12, 0), x_dir=(1, 0, 0), z_dir=(0, 1, 0))):
        with Locations((37.5, -42.944645862)):
            Rectangle(ESQUISSE18_W, ESQUISSE18_H)
        with Locations((-37.5, -42.944645862)):
            Rectangle(ESQUISSE18_W, ESQUISSE18_H)
        Polygon((-52.363526329, -7.006996341), (-57.613526329, -16.100263081), (-59.518782217, -15.000263081), (-54.268782217, -5.906996341), align=None)
        Polygon((-20.113526329, 48.851642203), (-22.018782217, 49.951642203), (-16.768782217, 59.044908943), (-14.863526329, 57.944908943), align=None)
        Polygon((20.113526329, 48.851642203), (14.863526329, 57.944908943), (16.768782217, 59.044908943), (22.018782217, 49.951642203), align=None)
        Polygon((52.363526329, -7.006996341), (54.268782217, -5.906996341), (59.518782217, -15.000263081), (57.613526329, -16.100263081), align=None)
    extrude(amount=-ENL_V_MAT_EXTRU_10_DEPTH, mode=Mode.SUBTRACT)


solid = part_3.part
